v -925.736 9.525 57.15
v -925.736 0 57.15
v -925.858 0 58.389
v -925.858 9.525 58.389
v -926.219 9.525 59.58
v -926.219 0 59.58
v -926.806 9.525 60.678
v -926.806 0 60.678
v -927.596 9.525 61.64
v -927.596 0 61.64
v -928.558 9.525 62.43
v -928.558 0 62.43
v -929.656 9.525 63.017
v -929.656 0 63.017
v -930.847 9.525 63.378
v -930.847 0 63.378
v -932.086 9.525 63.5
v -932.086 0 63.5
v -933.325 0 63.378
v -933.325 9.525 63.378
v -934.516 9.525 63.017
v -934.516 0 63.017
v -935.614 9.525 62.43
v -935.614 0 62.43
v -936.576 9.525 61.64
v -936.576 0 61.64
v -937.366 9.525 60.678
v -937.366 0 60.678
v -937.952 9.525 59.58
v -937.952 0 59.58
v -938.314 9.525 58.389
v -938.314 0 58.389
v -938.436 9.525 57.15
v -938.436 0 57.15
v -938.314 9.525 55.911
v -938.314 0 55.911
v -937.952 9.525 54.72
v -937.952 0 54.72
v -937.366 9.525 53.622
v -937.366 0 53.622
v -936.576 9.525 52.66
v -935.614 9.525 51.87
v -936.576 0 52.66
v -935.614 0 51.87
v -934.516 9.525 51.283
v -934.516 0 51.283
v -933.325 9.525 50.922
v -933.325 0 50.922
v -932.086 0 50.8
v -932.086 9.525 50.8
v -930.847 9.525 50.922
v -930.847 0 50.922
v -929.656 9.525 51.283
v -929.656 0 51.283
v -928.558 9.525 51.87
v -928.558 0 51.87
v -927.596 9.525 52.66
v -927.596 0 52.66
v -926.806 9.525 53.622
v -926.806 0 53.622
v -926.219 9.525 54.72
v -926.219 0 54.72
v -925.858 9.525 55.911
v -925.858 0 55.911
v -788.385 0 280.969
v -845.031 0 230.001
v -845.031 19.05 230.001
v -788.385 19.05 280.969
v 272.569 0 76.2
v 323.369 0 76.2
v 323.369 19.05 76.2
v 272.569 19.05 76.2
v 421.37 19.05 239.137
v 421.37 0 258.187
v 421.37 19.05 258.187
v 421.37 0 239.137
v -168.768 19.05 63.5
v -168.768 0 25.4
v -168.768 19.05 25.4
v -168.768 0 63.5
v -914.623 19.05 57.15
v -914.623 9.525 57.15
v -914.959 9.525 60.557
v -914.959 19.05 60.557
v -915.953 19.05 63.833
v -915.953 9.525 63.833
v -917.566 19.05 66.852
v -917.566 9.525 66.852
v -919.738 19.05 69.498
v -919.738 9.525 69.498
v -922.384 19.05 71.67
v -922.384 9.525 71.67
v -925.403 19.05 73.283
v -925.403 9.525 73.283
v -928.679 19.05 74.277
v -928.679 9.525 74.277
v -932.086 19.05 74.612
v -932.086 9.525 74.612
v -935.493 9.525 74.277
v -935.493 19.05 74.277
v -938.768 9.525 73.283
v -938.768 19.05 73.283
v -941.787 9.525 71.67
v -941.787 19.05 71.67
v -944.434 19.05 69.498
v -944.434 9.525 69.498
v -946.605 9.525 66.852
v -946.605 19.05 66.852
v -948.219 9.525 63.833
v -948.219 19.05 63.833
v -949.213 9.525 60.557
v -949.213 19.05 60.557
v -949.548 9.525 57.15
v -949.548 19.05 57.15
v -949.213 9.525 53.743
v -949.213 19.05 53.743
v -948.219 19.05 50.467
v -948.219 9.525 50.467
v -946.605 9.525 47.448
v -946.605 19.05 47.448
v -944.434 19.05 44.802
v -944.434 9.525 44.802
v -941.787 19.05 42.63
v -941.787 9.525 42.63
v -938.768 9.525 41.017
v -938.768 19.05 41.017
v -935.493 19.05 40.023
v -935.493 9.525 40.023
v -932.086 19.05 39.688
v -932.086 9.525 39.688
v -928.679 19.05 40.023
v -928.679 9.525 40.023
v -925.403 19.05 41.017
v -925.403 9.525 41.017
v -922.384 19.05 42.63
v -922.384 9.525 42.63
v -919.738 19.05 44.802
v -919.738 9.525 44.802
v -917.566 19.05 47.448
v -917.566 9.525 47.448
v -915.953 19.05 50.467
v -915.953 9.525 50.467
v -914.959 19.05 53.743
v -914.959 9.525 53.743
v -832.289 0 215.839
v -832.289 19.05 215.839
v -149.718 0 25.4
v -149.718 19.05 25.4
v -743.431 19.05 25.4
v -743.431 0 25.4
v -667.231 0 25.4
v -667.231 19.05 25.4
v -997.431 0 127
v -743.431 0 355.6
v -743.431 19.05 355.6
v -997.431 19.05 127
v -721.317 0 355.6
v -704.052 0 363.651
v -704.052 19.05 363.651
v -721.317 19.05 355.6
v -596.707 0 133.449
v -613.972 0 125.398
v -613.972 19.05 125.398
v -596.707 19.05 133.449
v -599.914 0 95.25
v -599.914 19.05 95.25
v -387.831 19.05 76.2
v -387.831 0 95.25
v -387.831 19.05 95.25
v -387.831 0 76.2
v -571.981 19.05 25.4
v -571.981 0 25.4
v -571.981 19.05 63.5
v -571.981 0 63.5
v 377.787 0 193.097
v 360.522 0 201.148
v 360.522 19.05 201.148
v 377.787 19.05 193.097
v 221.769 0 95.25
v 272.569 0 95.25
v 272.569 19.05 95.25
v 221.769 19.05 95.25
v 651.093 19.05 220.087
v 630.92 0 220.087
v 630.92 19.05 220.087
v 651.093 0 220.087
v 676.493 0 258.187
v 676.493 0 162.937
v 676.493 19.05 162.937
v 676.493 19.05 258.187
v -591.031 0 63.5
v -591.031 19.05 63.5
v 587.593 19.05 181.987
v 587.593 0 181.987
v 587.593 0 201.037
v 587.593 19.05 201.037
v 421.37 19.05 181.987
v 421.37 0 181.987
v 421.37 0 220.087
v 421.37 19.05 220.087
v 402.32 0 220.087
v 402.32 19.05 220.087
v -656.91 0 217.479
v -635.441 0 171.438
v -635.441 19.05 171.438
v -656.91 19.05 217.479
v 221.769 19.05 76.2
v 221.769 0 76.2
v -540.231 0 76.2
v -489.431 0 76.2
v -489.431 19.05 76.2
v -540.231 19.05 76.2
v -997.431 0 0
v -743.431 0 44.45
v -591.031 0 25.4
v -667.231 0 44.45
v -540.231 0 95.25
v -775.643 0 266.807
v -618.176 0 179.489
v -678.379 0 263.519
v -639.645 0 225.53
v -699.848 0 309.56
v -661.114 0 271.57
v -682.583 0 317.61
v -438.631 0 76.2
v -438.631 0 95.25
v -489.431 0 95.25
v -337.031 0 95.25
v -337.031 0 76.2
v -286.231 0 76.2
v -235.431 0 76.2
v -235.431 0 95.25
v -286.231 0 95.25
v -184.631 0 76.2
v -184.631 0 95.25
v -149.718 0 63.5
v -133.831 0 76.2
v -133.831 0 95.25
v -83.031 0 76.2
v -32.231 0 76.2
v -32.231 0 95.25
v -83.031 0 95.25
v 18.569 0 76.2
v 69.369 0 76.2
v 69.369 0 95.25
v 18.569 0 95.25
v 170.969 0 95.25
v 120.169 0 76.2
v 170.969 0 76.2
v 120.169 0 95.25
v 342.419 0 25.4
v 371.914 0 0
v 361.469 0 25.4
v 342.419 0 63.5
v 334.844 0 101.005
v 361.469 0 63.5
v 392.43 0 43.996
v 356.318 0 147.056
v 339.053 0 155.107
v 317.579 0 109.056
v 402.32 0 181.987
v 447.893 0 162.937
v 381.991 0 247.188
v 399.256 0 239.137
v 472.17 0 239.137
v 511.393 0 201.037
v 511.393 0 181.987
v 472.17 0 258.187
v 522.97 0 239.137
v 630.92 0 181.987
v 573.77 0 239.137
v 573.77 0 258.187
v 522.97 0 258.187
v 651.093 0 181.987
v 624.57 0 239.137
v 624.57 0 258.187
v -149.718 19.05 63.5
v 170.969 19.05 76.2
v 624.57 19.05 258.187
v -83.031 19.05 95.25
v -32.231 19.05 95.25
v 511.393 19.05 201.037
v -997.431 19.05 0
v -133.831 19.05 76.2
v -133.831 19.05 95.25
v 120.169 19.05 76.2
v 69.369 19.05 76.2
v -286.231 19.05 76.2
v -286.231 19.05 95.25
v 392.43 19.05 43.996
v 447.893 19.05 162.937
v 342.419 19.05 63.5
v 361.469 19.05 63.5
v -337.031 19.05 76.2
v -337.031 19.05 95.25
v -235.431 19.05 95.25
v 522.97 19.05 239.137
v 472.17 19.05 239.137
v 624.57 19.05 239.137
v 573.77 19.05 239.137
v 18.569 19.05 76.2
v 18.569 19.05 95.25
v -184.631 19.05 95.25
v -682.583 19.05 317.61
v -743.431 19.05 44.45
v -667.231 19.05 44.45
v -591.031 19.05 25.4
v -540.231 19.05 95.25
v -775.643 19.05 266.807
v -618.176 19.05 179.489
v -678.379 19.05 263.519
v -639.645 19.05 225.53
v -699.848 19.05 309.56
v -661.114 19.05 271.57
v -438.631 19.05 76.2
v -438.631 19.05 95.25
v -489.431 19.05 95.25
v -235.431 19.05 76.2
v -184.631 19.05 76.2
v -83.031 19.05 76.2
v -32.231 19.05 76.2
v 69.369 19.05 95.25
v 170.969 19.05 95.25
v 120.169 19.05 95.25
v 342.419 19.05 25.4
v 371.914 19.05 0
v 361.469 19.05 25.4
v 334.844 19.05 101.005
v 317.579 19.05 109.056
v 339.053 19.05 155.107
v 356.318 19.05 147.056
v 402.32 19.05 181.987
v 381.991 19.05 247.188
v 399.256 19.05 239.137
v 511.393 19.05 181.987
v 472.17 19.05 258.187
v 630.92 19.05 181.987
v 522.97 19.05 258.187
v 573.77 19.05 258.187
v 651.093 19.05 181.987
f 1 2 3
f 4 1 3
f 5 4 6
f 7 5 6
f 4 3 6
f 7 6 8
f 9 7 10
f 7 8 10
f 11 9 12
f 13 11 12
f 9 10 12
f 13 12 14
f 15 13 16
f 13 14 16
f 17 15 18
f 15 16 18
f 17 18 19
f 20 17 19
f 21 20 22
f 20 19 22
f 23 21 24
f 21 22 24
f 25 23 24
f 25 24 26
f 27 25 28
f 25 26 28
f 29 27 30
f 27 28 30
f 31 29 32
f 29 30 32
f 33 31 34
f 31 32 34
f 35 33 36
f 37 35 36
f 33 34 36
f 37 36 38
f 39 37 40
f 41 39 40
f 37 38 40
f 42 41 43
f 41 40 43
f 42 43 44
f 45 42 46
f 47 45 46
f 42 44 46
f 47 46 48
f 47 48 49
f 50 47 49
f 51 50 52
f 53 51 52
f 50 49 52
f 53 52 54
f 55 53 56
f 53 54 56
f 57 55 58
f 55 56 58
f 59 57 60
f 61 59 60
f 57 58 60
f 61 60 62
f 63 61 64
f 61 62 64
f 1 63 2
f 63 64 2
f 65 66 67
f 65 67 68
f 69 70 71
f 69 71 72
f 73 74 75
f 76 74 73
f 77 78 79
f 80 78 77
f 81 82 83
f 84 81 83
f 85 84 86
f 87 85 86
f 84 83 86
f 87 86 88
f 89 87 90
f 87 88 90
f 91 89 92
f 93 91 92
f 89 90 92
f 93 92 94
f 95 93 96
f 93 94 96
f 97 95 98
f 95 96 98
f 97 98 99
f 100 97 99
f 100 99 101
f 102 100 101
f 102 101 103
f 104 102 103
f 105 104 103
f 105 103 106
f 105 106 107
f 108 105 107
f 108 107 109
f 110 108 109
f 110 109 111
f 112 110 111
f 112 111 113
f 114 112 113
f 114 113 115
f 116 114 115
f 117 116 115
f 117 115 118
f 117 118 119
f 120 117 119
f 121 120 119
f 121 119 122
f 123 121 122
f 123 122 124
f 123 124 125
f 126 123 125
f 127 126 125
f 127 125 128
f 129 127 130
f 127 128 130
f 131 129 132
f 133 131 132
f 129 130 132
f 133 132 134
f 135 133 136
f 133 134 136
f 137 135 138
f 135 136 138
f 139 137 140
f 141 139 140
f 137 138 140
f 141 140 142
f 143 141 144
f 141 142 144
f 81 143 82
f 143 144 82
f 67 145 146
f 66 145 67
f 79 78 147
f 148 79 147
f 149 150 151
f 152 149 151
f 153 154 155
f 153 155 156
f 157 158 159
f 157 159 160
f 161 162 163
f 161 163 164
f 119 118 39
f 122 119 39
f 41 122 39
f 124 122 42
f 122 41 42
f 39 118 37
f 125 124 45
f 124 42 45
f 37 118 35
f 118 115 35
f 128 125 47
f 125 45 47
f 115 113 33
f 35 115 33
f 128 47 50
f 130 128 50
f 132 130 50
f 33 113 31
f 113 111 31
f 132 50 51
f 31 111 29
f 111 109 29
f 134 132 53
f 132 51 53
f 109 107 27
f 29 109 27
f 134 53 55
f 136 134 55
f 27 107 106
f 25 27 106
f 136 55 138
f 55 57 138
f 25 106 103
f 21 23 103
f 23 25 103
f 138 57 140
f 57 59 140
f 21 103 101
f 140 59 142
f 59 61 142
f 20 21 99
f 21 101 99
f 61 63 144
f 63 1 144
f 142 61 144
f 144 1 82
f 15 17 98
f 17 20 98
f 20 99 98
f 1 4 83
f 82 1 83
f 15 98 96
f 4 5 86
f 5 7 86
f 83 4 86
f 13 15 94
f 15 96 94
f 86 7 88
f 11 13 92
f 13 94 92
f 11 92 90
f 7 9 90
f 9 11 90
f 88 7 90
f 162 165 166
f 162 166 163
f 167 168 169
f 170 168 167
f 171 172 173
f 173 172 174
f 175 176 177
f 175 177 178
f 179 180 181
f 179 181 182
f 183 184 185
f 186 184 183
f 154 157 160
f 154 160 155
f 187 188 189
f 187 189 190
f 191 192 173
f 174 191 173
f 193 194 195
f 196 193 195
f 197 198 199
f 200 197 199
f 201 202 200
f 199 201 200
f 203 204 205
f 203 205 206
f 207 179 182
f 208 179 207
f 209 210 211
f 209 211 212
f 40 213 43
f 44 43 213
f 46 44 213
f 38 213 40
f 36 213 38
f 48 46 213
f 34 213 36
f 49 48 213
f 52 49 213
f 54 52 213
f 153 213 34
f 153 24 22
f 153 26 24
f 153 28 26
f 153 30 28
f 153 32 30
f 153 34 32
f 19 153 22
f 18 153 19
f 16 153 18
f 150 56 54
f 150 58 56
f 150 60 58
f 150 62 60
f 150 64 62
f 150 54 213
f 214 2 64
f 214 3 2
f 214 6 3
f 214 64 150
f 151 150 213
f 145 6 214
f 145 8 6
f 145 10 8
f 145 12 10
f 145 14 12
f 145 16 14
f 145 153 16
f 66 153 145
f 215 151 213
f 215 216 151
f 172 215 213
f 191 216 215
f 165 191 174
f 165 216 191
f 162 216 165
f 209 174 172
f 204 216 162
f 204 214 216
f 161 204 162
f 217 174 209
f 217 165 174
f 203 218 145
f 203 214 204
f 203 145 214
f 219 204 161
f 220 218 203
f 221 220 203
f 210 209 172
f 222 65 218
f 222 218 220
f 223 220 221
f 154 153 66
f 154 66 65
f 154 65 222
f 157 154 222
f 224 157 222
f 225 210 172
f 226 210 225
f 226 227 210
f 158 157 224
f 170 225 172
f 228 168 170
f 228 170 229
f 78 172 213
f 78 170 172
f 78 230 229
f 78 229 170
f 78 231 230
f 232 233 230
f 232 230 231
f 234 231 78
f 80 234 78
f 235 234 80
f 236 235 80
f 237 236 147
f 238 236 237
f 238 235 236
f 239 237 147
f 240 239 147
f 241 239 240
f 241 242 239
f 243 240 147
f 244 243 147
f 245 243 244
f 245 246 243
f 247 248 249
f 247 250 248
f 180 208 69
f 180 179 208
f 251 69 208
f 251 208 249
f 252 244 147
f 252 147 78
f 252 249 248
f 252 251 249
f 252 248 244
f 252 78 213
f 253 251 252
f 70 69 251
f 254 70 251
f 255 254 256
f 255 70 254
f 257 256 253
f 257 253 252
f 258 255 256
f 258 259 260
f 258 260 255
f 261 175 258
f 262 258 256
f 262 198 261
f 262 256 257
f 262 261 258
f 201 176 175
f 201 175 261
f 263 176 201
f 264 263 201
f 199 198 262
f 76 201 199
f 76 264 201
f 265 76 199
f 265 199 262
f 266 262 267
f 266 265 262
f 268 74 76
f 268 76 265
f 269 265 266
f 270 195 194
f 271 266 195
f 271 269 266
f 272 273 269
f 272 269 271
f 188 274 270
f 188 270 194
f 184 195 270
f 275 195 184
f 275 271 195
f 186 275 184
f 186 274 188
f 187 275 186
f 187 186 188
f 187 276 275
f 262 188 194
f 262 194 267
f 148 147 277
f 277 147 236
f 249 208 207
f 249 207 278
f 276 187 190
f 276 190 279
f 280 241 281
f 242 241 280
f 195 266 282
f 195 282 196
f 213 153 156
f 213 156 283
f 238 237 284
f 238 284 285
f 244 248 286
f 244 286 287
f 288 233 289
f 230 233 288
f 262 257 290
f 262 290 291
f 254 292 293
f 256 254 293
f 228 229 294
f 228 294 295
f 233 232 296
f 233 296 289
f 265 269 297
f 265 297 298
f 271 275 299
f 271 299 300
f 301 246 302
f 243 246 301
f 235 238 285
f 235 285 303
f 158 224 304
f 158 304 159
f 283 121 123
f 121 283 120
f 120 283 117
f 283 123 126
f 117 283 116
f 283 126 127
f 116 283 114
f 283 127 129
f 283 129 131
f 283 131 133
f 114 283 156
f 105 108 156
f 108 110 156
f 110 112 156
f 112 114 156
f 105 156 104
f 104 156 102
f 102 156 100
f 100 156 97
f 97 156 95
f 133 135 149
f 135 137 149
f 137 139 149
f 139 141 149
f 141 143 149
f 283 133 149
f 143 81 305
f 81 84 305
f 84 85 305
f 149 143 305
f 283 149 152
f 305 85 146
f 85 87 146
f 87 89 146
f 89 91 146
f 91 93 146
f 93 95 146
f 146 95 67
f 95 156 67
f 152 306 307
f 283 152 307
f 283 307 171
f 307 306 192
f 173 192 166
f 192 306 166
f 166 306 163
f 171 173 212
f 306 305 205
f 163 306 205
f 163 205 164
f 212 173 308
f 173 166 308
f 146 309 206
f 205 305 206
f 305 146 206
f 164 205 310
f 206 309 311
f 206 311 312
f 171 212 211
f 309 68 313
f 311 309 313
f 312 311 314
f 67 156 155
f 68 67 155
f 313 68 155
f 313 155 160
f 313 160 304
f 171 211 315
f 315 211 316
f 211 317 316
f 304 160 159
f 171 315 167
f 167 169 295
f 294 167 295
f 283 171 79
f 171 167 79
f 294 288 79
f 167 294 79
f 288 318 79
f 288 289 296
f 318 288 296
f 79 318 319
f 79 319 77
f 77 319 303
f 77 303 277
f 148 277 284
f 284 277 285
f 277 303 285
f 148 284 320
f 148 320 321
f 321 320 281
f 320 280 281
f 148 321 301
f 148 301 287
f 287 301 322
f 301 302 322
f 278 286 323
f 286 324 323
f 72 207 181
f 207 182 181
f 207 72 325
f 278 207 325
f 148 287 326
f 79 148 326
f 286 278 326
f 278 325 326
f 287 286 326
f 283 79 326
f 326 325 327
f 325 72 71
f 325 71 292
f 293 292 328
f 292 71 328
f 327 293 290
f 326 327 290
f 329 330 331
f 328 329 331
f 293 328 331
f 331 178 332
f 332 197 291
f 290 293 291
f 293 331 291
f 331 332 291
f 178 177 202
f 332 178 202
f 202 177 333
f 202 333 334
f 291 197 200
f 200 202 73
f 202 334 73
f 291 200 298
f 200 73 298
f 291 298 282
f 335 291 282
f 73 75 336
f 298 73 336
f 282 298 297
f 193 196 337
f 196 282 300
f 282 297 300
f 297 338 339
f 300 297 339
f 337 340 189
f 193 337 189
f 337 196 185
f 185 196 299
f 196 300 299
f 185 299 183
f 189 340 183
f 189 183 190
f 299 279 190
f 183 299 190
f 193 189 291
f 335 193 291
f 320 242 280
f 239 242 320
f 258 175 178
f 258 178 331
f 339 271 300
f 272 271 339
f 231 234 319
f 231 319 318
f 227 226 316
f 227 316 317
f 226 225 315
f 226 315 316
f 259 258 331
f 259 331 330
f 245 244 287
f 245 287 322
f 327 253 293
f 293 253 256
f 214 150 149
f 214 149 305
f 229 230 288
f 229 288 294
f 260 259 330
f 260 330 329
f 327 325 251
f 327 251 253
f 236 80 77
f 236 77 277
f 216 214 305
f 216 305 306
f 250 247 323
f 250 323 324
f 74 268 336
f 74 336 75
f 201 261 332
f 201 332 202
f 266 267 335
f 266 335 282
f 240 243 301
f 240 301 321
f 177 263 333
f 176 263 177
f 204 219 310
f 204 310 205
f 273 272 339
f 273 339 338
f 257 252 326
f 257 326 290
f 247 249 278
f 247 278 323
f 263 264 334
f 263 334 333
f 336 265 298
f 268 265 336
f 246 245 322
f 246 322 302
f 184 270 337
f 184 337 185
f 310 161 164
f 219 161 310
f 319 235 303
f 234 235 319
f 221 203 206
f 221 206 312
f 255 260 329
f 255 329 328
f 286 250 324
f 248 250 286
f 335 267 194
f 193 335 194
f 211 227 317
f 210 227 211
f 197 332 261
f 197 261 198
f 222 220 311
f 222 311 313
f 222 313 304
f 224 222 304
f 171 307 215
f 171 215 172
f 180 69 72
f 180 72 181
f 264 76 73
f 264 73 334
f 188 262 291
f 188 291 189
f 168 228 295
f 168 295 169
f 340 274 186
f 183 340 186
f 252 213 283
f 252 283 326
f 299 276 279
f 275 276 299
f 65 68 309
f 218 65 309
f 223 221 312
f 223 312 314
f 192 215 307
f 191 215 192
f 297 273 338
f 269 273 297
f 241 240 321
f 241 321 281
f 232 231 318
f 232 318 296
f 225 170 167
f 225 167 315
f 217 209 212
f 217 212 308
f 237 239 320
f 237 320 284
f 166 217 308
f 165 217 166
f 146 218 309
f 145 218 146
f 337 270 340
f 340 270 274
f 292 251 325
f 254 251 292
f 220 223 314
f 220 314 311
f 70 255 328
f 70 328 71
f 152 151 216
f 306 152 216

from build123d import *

# Parameters (mm, degrees)
F0_W     = 76.2
F0_H     = 19.05
F0_W_2   = 19.05
F0_H_2   = 38.1
F0_R     = 17.4625
F0_W_3   = 20.17304
F1_DEPTH = 19.05
F0_R_2   = 6.35
F2_DEPTH = 9.525


with BuildPart() as f1:
    # F0 (on Front) → F1 (new body)
    with BuildSketch(Plane.XZ):
        Polygon((-489.430563, 76.2), (-540.230563, 76.2), (-540.230563, 95.25), (-591.030563, 95.25), (-599.913724, 95.25), (-613.971884, 125.397822), (-596.706721, 133.4487), (-618.175729, 179.489136), (-635.440892, 171.438258), (-656.9099, 217.478693), (-639.644736, 225.529571), (-661.113744, 271.570007), (-678.378907, 263.519129), (-699.847915, 309.559564), (-682.582752, 317.610442), (-704.051759, 363.650878), (-721.316923, 355.6), (-743.430563, 355.6), (-997.430563, 127), (-997.430563, 0), (-591.030563, 0), (342.419437, 0), (371.914191, 0), (392.43009, 43.996488), (447.893046, 162.937181), (502.200551, 162.937181), (676.493046, 162.937181), (676.493046, 239.137181), (676.493046, 258.187181), (624.570006, 258.187181), (624.570006, 239.137181), (573.770006, 239.137181), (573.770006, 258.187181), (522.970006, 258.187181), (522.970006, 239.137181), (472.170006, 239.137181), (472.170006, 258.187181), (421.370006, 258.187181), (421.370006, 239.137181), (399.256366, 239.137181), (381.991203, 247.188059), (360.522195, 201.147623), (377.787358, 193.096745), (356.318351, 147.05631), (339.053221, 155.107172), (317.579072, 109.055711), (334.844236, 101.004833), (323.369437, 76.2), (272.569437, 76.2), (272.569437, 95.25), (221.769437, 95.25), (221.769437, 76.2), (170.969437, 76.2), (170.969437, 95.25), (120.169437, 95.25), (120.169437, 76.2), (69.369437, 76.2), (69.369437, 95.25), (18.569437, 95.25), (18.569437, 76.2), (-32.230563, 76.2), (-32.230563, 95.25), (-83.030563, 95.25), (-83.030563, 76.2), (-133.830563, 76.2), (-133.830563, 95.25), (-184.630563, 95.25), (-184.630563, 76.2), (-235.430563, 76.2), (-235.430563, 95.25), (-286.230563, 95.25), (-286.230563, 76.2), (-337.030563, 76.2), (-337.030563, 95.25), (-387.830563, 95.25), (-387.830563, 76.2), (-438.630563, 76.2), (-438.630563, 95.25), (-489.430563, 95.25), align=None)
        with Locations((-705.330563, 34.925)):
            Rectangle(F0_W, F0_H, mode=Mode.SUBTRACT)
        with Locations((-581.505563, 44.45)):
            Rectangle(F0_W_2, F0_H_2, mode=Mode.SUBTRACT)
        with Locations((-932.085752, 57.15)):
            Circle(F0_R, mode=Mode.SUBTRACT)
        with Locations((-159.243268, 44.45)):
            Rectangle(F0_W_2, F0_H_2, mode=Mode.SUBTRACT)
        with Locations((351.944437, 44.45)):
            Rectangle(F0_W_2, F0_H_2, mode=Mode.SUBTRACT)
        Polygon((-832.288567, 215.839342), (-845.030563, 230.0007), (-788.385133, 280.968682), (-775.643137, 266.807325), align=None, mode=Mode.SUBTRACT)
        with Locations((411.845006, 201.037181)):
            Rectangle(F0_W_2, F0_H_2, mode=Mode.SUBTRACT)
        with Locations((549.493046, 191.512181)):
            Rectangle(F0_W, F0_H, mode=Mode.SUBTRACT)
        with Locations((641.006526, 201.037181)):
            Rectangle(F0_W_3, F0_H_2, mode=Mode.SUBTRACT)
    extrude(amount=-F1_DEPTH)

    # F0 (on Front) → F2 (join)
    with BuildSketch(Plane.XZ):
        with Locations((-932.085752, 57.15)):
            Circle(F0_R)
        with Locations((-932.085752, 57.15)):
            Circle(F0_R_2, mode=Mode.SUBTRACT)
    extrude(amount=-F2_DEPTH)


solid = f1.part
